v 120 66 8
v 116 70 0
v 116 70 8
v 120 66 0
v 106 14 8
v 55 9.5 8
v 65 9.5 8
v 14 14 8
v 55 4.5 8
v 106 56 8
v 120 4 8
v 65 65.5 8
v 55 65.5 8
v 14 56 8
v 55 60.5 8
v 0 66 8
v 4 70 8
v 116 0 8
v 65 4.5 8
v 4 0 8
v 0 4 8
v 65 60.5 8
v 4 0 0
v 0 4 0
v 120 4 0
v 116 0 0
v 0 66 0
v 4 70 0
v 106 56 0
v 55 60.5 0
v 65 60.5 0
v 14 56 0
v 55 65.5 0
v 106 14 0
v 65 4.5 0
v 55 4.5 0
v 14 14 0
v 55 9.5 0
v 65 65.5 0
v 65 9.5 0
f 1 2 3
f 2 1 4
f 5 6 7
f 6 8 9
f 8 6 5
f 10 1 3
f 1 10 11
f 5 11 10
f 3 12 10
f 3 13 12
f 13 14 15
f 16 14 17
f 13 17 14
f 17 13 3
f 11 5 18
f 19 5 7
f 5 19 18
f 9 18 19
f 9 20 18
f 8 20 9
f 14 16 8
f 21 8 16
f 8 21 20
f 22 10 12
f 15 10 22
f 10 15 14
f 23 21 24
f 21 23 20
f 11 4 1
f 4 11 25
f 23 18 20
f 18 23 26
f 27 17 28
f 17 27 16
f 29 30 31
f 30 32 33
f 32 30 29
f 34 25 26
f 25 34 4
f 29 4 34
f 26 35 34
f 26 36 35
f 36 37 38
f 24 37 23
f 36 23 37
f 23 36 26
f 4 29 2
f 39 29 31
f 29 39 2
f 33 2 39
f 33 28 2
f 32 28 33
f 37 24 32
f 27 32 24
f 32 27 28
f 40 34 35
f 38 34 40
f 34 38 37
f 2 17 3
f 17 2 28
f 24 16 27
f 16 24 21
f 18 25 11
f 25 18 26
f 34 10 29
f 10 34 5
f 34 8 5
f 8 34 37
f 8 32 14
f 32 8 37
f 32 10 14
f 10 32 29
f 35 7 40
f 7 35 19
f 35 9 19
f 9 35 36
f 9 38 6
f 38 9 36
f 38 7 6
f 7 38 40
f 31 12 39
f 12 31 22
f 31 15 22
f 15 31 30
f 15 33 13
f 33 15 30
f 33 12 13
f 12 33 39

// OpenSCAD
$fn = 32;

// ----------------------------------------------------------------------
// Frame plate: 120 x 70 frame, 14 mm rails
// ----------------------------------------------------------------------

// --- parameters (mm) ---
plate_l = 120;            // plate length, X
plate_w = 70;             // plate width, Y
plate_t = 8;              // plate thickness, Z (extrusion height)
corner_c = 4;             // corner chamfer
frame_bar = 14;           // frame rail width
slot_l = 10;              // adjustment slot length
slot_w = 5;               // adjustment slot width

win_l = plate_l - 2 * frame_bar;  // window length
win_w = plate_w - 2 * frame_bar;  // window width

profile = [[4, 0], [116, 0], [120, 4], [120, 66], [116, 70], [4, 70], [0, 66], [0, 4]];  // primary outline, 8 points, counter clockwise
void_1 = [[14, 14], [106, 14], [106, 56], [14, 56]];  // the window, 4 points
void_2 = [[55, 4.5], [65, 4.5], [65, 9.5], [55, 9.5]];  // adjustment slot, 4 points
void_3 = [[55, 60.5], [65, 60.5], [65, 65.5], [55, 65.5]];  // adjustment slot, 4 points

// --- the one profile operation ---
difference() {
  linear_extrude(height = plate_t) polygon(points = profile);
  translate([0, 0, -1])
    linear_extrude(height = plate_t + 2) polygon(points = void_1);
  translate([0, 0, -1])
    linear_extrude(height = plate_t + 2) polygon(points = void_2);
  translate([0, 0, -1])
    linear_extrude(height = plate_t + 2) polygon(points = void_3);
}
